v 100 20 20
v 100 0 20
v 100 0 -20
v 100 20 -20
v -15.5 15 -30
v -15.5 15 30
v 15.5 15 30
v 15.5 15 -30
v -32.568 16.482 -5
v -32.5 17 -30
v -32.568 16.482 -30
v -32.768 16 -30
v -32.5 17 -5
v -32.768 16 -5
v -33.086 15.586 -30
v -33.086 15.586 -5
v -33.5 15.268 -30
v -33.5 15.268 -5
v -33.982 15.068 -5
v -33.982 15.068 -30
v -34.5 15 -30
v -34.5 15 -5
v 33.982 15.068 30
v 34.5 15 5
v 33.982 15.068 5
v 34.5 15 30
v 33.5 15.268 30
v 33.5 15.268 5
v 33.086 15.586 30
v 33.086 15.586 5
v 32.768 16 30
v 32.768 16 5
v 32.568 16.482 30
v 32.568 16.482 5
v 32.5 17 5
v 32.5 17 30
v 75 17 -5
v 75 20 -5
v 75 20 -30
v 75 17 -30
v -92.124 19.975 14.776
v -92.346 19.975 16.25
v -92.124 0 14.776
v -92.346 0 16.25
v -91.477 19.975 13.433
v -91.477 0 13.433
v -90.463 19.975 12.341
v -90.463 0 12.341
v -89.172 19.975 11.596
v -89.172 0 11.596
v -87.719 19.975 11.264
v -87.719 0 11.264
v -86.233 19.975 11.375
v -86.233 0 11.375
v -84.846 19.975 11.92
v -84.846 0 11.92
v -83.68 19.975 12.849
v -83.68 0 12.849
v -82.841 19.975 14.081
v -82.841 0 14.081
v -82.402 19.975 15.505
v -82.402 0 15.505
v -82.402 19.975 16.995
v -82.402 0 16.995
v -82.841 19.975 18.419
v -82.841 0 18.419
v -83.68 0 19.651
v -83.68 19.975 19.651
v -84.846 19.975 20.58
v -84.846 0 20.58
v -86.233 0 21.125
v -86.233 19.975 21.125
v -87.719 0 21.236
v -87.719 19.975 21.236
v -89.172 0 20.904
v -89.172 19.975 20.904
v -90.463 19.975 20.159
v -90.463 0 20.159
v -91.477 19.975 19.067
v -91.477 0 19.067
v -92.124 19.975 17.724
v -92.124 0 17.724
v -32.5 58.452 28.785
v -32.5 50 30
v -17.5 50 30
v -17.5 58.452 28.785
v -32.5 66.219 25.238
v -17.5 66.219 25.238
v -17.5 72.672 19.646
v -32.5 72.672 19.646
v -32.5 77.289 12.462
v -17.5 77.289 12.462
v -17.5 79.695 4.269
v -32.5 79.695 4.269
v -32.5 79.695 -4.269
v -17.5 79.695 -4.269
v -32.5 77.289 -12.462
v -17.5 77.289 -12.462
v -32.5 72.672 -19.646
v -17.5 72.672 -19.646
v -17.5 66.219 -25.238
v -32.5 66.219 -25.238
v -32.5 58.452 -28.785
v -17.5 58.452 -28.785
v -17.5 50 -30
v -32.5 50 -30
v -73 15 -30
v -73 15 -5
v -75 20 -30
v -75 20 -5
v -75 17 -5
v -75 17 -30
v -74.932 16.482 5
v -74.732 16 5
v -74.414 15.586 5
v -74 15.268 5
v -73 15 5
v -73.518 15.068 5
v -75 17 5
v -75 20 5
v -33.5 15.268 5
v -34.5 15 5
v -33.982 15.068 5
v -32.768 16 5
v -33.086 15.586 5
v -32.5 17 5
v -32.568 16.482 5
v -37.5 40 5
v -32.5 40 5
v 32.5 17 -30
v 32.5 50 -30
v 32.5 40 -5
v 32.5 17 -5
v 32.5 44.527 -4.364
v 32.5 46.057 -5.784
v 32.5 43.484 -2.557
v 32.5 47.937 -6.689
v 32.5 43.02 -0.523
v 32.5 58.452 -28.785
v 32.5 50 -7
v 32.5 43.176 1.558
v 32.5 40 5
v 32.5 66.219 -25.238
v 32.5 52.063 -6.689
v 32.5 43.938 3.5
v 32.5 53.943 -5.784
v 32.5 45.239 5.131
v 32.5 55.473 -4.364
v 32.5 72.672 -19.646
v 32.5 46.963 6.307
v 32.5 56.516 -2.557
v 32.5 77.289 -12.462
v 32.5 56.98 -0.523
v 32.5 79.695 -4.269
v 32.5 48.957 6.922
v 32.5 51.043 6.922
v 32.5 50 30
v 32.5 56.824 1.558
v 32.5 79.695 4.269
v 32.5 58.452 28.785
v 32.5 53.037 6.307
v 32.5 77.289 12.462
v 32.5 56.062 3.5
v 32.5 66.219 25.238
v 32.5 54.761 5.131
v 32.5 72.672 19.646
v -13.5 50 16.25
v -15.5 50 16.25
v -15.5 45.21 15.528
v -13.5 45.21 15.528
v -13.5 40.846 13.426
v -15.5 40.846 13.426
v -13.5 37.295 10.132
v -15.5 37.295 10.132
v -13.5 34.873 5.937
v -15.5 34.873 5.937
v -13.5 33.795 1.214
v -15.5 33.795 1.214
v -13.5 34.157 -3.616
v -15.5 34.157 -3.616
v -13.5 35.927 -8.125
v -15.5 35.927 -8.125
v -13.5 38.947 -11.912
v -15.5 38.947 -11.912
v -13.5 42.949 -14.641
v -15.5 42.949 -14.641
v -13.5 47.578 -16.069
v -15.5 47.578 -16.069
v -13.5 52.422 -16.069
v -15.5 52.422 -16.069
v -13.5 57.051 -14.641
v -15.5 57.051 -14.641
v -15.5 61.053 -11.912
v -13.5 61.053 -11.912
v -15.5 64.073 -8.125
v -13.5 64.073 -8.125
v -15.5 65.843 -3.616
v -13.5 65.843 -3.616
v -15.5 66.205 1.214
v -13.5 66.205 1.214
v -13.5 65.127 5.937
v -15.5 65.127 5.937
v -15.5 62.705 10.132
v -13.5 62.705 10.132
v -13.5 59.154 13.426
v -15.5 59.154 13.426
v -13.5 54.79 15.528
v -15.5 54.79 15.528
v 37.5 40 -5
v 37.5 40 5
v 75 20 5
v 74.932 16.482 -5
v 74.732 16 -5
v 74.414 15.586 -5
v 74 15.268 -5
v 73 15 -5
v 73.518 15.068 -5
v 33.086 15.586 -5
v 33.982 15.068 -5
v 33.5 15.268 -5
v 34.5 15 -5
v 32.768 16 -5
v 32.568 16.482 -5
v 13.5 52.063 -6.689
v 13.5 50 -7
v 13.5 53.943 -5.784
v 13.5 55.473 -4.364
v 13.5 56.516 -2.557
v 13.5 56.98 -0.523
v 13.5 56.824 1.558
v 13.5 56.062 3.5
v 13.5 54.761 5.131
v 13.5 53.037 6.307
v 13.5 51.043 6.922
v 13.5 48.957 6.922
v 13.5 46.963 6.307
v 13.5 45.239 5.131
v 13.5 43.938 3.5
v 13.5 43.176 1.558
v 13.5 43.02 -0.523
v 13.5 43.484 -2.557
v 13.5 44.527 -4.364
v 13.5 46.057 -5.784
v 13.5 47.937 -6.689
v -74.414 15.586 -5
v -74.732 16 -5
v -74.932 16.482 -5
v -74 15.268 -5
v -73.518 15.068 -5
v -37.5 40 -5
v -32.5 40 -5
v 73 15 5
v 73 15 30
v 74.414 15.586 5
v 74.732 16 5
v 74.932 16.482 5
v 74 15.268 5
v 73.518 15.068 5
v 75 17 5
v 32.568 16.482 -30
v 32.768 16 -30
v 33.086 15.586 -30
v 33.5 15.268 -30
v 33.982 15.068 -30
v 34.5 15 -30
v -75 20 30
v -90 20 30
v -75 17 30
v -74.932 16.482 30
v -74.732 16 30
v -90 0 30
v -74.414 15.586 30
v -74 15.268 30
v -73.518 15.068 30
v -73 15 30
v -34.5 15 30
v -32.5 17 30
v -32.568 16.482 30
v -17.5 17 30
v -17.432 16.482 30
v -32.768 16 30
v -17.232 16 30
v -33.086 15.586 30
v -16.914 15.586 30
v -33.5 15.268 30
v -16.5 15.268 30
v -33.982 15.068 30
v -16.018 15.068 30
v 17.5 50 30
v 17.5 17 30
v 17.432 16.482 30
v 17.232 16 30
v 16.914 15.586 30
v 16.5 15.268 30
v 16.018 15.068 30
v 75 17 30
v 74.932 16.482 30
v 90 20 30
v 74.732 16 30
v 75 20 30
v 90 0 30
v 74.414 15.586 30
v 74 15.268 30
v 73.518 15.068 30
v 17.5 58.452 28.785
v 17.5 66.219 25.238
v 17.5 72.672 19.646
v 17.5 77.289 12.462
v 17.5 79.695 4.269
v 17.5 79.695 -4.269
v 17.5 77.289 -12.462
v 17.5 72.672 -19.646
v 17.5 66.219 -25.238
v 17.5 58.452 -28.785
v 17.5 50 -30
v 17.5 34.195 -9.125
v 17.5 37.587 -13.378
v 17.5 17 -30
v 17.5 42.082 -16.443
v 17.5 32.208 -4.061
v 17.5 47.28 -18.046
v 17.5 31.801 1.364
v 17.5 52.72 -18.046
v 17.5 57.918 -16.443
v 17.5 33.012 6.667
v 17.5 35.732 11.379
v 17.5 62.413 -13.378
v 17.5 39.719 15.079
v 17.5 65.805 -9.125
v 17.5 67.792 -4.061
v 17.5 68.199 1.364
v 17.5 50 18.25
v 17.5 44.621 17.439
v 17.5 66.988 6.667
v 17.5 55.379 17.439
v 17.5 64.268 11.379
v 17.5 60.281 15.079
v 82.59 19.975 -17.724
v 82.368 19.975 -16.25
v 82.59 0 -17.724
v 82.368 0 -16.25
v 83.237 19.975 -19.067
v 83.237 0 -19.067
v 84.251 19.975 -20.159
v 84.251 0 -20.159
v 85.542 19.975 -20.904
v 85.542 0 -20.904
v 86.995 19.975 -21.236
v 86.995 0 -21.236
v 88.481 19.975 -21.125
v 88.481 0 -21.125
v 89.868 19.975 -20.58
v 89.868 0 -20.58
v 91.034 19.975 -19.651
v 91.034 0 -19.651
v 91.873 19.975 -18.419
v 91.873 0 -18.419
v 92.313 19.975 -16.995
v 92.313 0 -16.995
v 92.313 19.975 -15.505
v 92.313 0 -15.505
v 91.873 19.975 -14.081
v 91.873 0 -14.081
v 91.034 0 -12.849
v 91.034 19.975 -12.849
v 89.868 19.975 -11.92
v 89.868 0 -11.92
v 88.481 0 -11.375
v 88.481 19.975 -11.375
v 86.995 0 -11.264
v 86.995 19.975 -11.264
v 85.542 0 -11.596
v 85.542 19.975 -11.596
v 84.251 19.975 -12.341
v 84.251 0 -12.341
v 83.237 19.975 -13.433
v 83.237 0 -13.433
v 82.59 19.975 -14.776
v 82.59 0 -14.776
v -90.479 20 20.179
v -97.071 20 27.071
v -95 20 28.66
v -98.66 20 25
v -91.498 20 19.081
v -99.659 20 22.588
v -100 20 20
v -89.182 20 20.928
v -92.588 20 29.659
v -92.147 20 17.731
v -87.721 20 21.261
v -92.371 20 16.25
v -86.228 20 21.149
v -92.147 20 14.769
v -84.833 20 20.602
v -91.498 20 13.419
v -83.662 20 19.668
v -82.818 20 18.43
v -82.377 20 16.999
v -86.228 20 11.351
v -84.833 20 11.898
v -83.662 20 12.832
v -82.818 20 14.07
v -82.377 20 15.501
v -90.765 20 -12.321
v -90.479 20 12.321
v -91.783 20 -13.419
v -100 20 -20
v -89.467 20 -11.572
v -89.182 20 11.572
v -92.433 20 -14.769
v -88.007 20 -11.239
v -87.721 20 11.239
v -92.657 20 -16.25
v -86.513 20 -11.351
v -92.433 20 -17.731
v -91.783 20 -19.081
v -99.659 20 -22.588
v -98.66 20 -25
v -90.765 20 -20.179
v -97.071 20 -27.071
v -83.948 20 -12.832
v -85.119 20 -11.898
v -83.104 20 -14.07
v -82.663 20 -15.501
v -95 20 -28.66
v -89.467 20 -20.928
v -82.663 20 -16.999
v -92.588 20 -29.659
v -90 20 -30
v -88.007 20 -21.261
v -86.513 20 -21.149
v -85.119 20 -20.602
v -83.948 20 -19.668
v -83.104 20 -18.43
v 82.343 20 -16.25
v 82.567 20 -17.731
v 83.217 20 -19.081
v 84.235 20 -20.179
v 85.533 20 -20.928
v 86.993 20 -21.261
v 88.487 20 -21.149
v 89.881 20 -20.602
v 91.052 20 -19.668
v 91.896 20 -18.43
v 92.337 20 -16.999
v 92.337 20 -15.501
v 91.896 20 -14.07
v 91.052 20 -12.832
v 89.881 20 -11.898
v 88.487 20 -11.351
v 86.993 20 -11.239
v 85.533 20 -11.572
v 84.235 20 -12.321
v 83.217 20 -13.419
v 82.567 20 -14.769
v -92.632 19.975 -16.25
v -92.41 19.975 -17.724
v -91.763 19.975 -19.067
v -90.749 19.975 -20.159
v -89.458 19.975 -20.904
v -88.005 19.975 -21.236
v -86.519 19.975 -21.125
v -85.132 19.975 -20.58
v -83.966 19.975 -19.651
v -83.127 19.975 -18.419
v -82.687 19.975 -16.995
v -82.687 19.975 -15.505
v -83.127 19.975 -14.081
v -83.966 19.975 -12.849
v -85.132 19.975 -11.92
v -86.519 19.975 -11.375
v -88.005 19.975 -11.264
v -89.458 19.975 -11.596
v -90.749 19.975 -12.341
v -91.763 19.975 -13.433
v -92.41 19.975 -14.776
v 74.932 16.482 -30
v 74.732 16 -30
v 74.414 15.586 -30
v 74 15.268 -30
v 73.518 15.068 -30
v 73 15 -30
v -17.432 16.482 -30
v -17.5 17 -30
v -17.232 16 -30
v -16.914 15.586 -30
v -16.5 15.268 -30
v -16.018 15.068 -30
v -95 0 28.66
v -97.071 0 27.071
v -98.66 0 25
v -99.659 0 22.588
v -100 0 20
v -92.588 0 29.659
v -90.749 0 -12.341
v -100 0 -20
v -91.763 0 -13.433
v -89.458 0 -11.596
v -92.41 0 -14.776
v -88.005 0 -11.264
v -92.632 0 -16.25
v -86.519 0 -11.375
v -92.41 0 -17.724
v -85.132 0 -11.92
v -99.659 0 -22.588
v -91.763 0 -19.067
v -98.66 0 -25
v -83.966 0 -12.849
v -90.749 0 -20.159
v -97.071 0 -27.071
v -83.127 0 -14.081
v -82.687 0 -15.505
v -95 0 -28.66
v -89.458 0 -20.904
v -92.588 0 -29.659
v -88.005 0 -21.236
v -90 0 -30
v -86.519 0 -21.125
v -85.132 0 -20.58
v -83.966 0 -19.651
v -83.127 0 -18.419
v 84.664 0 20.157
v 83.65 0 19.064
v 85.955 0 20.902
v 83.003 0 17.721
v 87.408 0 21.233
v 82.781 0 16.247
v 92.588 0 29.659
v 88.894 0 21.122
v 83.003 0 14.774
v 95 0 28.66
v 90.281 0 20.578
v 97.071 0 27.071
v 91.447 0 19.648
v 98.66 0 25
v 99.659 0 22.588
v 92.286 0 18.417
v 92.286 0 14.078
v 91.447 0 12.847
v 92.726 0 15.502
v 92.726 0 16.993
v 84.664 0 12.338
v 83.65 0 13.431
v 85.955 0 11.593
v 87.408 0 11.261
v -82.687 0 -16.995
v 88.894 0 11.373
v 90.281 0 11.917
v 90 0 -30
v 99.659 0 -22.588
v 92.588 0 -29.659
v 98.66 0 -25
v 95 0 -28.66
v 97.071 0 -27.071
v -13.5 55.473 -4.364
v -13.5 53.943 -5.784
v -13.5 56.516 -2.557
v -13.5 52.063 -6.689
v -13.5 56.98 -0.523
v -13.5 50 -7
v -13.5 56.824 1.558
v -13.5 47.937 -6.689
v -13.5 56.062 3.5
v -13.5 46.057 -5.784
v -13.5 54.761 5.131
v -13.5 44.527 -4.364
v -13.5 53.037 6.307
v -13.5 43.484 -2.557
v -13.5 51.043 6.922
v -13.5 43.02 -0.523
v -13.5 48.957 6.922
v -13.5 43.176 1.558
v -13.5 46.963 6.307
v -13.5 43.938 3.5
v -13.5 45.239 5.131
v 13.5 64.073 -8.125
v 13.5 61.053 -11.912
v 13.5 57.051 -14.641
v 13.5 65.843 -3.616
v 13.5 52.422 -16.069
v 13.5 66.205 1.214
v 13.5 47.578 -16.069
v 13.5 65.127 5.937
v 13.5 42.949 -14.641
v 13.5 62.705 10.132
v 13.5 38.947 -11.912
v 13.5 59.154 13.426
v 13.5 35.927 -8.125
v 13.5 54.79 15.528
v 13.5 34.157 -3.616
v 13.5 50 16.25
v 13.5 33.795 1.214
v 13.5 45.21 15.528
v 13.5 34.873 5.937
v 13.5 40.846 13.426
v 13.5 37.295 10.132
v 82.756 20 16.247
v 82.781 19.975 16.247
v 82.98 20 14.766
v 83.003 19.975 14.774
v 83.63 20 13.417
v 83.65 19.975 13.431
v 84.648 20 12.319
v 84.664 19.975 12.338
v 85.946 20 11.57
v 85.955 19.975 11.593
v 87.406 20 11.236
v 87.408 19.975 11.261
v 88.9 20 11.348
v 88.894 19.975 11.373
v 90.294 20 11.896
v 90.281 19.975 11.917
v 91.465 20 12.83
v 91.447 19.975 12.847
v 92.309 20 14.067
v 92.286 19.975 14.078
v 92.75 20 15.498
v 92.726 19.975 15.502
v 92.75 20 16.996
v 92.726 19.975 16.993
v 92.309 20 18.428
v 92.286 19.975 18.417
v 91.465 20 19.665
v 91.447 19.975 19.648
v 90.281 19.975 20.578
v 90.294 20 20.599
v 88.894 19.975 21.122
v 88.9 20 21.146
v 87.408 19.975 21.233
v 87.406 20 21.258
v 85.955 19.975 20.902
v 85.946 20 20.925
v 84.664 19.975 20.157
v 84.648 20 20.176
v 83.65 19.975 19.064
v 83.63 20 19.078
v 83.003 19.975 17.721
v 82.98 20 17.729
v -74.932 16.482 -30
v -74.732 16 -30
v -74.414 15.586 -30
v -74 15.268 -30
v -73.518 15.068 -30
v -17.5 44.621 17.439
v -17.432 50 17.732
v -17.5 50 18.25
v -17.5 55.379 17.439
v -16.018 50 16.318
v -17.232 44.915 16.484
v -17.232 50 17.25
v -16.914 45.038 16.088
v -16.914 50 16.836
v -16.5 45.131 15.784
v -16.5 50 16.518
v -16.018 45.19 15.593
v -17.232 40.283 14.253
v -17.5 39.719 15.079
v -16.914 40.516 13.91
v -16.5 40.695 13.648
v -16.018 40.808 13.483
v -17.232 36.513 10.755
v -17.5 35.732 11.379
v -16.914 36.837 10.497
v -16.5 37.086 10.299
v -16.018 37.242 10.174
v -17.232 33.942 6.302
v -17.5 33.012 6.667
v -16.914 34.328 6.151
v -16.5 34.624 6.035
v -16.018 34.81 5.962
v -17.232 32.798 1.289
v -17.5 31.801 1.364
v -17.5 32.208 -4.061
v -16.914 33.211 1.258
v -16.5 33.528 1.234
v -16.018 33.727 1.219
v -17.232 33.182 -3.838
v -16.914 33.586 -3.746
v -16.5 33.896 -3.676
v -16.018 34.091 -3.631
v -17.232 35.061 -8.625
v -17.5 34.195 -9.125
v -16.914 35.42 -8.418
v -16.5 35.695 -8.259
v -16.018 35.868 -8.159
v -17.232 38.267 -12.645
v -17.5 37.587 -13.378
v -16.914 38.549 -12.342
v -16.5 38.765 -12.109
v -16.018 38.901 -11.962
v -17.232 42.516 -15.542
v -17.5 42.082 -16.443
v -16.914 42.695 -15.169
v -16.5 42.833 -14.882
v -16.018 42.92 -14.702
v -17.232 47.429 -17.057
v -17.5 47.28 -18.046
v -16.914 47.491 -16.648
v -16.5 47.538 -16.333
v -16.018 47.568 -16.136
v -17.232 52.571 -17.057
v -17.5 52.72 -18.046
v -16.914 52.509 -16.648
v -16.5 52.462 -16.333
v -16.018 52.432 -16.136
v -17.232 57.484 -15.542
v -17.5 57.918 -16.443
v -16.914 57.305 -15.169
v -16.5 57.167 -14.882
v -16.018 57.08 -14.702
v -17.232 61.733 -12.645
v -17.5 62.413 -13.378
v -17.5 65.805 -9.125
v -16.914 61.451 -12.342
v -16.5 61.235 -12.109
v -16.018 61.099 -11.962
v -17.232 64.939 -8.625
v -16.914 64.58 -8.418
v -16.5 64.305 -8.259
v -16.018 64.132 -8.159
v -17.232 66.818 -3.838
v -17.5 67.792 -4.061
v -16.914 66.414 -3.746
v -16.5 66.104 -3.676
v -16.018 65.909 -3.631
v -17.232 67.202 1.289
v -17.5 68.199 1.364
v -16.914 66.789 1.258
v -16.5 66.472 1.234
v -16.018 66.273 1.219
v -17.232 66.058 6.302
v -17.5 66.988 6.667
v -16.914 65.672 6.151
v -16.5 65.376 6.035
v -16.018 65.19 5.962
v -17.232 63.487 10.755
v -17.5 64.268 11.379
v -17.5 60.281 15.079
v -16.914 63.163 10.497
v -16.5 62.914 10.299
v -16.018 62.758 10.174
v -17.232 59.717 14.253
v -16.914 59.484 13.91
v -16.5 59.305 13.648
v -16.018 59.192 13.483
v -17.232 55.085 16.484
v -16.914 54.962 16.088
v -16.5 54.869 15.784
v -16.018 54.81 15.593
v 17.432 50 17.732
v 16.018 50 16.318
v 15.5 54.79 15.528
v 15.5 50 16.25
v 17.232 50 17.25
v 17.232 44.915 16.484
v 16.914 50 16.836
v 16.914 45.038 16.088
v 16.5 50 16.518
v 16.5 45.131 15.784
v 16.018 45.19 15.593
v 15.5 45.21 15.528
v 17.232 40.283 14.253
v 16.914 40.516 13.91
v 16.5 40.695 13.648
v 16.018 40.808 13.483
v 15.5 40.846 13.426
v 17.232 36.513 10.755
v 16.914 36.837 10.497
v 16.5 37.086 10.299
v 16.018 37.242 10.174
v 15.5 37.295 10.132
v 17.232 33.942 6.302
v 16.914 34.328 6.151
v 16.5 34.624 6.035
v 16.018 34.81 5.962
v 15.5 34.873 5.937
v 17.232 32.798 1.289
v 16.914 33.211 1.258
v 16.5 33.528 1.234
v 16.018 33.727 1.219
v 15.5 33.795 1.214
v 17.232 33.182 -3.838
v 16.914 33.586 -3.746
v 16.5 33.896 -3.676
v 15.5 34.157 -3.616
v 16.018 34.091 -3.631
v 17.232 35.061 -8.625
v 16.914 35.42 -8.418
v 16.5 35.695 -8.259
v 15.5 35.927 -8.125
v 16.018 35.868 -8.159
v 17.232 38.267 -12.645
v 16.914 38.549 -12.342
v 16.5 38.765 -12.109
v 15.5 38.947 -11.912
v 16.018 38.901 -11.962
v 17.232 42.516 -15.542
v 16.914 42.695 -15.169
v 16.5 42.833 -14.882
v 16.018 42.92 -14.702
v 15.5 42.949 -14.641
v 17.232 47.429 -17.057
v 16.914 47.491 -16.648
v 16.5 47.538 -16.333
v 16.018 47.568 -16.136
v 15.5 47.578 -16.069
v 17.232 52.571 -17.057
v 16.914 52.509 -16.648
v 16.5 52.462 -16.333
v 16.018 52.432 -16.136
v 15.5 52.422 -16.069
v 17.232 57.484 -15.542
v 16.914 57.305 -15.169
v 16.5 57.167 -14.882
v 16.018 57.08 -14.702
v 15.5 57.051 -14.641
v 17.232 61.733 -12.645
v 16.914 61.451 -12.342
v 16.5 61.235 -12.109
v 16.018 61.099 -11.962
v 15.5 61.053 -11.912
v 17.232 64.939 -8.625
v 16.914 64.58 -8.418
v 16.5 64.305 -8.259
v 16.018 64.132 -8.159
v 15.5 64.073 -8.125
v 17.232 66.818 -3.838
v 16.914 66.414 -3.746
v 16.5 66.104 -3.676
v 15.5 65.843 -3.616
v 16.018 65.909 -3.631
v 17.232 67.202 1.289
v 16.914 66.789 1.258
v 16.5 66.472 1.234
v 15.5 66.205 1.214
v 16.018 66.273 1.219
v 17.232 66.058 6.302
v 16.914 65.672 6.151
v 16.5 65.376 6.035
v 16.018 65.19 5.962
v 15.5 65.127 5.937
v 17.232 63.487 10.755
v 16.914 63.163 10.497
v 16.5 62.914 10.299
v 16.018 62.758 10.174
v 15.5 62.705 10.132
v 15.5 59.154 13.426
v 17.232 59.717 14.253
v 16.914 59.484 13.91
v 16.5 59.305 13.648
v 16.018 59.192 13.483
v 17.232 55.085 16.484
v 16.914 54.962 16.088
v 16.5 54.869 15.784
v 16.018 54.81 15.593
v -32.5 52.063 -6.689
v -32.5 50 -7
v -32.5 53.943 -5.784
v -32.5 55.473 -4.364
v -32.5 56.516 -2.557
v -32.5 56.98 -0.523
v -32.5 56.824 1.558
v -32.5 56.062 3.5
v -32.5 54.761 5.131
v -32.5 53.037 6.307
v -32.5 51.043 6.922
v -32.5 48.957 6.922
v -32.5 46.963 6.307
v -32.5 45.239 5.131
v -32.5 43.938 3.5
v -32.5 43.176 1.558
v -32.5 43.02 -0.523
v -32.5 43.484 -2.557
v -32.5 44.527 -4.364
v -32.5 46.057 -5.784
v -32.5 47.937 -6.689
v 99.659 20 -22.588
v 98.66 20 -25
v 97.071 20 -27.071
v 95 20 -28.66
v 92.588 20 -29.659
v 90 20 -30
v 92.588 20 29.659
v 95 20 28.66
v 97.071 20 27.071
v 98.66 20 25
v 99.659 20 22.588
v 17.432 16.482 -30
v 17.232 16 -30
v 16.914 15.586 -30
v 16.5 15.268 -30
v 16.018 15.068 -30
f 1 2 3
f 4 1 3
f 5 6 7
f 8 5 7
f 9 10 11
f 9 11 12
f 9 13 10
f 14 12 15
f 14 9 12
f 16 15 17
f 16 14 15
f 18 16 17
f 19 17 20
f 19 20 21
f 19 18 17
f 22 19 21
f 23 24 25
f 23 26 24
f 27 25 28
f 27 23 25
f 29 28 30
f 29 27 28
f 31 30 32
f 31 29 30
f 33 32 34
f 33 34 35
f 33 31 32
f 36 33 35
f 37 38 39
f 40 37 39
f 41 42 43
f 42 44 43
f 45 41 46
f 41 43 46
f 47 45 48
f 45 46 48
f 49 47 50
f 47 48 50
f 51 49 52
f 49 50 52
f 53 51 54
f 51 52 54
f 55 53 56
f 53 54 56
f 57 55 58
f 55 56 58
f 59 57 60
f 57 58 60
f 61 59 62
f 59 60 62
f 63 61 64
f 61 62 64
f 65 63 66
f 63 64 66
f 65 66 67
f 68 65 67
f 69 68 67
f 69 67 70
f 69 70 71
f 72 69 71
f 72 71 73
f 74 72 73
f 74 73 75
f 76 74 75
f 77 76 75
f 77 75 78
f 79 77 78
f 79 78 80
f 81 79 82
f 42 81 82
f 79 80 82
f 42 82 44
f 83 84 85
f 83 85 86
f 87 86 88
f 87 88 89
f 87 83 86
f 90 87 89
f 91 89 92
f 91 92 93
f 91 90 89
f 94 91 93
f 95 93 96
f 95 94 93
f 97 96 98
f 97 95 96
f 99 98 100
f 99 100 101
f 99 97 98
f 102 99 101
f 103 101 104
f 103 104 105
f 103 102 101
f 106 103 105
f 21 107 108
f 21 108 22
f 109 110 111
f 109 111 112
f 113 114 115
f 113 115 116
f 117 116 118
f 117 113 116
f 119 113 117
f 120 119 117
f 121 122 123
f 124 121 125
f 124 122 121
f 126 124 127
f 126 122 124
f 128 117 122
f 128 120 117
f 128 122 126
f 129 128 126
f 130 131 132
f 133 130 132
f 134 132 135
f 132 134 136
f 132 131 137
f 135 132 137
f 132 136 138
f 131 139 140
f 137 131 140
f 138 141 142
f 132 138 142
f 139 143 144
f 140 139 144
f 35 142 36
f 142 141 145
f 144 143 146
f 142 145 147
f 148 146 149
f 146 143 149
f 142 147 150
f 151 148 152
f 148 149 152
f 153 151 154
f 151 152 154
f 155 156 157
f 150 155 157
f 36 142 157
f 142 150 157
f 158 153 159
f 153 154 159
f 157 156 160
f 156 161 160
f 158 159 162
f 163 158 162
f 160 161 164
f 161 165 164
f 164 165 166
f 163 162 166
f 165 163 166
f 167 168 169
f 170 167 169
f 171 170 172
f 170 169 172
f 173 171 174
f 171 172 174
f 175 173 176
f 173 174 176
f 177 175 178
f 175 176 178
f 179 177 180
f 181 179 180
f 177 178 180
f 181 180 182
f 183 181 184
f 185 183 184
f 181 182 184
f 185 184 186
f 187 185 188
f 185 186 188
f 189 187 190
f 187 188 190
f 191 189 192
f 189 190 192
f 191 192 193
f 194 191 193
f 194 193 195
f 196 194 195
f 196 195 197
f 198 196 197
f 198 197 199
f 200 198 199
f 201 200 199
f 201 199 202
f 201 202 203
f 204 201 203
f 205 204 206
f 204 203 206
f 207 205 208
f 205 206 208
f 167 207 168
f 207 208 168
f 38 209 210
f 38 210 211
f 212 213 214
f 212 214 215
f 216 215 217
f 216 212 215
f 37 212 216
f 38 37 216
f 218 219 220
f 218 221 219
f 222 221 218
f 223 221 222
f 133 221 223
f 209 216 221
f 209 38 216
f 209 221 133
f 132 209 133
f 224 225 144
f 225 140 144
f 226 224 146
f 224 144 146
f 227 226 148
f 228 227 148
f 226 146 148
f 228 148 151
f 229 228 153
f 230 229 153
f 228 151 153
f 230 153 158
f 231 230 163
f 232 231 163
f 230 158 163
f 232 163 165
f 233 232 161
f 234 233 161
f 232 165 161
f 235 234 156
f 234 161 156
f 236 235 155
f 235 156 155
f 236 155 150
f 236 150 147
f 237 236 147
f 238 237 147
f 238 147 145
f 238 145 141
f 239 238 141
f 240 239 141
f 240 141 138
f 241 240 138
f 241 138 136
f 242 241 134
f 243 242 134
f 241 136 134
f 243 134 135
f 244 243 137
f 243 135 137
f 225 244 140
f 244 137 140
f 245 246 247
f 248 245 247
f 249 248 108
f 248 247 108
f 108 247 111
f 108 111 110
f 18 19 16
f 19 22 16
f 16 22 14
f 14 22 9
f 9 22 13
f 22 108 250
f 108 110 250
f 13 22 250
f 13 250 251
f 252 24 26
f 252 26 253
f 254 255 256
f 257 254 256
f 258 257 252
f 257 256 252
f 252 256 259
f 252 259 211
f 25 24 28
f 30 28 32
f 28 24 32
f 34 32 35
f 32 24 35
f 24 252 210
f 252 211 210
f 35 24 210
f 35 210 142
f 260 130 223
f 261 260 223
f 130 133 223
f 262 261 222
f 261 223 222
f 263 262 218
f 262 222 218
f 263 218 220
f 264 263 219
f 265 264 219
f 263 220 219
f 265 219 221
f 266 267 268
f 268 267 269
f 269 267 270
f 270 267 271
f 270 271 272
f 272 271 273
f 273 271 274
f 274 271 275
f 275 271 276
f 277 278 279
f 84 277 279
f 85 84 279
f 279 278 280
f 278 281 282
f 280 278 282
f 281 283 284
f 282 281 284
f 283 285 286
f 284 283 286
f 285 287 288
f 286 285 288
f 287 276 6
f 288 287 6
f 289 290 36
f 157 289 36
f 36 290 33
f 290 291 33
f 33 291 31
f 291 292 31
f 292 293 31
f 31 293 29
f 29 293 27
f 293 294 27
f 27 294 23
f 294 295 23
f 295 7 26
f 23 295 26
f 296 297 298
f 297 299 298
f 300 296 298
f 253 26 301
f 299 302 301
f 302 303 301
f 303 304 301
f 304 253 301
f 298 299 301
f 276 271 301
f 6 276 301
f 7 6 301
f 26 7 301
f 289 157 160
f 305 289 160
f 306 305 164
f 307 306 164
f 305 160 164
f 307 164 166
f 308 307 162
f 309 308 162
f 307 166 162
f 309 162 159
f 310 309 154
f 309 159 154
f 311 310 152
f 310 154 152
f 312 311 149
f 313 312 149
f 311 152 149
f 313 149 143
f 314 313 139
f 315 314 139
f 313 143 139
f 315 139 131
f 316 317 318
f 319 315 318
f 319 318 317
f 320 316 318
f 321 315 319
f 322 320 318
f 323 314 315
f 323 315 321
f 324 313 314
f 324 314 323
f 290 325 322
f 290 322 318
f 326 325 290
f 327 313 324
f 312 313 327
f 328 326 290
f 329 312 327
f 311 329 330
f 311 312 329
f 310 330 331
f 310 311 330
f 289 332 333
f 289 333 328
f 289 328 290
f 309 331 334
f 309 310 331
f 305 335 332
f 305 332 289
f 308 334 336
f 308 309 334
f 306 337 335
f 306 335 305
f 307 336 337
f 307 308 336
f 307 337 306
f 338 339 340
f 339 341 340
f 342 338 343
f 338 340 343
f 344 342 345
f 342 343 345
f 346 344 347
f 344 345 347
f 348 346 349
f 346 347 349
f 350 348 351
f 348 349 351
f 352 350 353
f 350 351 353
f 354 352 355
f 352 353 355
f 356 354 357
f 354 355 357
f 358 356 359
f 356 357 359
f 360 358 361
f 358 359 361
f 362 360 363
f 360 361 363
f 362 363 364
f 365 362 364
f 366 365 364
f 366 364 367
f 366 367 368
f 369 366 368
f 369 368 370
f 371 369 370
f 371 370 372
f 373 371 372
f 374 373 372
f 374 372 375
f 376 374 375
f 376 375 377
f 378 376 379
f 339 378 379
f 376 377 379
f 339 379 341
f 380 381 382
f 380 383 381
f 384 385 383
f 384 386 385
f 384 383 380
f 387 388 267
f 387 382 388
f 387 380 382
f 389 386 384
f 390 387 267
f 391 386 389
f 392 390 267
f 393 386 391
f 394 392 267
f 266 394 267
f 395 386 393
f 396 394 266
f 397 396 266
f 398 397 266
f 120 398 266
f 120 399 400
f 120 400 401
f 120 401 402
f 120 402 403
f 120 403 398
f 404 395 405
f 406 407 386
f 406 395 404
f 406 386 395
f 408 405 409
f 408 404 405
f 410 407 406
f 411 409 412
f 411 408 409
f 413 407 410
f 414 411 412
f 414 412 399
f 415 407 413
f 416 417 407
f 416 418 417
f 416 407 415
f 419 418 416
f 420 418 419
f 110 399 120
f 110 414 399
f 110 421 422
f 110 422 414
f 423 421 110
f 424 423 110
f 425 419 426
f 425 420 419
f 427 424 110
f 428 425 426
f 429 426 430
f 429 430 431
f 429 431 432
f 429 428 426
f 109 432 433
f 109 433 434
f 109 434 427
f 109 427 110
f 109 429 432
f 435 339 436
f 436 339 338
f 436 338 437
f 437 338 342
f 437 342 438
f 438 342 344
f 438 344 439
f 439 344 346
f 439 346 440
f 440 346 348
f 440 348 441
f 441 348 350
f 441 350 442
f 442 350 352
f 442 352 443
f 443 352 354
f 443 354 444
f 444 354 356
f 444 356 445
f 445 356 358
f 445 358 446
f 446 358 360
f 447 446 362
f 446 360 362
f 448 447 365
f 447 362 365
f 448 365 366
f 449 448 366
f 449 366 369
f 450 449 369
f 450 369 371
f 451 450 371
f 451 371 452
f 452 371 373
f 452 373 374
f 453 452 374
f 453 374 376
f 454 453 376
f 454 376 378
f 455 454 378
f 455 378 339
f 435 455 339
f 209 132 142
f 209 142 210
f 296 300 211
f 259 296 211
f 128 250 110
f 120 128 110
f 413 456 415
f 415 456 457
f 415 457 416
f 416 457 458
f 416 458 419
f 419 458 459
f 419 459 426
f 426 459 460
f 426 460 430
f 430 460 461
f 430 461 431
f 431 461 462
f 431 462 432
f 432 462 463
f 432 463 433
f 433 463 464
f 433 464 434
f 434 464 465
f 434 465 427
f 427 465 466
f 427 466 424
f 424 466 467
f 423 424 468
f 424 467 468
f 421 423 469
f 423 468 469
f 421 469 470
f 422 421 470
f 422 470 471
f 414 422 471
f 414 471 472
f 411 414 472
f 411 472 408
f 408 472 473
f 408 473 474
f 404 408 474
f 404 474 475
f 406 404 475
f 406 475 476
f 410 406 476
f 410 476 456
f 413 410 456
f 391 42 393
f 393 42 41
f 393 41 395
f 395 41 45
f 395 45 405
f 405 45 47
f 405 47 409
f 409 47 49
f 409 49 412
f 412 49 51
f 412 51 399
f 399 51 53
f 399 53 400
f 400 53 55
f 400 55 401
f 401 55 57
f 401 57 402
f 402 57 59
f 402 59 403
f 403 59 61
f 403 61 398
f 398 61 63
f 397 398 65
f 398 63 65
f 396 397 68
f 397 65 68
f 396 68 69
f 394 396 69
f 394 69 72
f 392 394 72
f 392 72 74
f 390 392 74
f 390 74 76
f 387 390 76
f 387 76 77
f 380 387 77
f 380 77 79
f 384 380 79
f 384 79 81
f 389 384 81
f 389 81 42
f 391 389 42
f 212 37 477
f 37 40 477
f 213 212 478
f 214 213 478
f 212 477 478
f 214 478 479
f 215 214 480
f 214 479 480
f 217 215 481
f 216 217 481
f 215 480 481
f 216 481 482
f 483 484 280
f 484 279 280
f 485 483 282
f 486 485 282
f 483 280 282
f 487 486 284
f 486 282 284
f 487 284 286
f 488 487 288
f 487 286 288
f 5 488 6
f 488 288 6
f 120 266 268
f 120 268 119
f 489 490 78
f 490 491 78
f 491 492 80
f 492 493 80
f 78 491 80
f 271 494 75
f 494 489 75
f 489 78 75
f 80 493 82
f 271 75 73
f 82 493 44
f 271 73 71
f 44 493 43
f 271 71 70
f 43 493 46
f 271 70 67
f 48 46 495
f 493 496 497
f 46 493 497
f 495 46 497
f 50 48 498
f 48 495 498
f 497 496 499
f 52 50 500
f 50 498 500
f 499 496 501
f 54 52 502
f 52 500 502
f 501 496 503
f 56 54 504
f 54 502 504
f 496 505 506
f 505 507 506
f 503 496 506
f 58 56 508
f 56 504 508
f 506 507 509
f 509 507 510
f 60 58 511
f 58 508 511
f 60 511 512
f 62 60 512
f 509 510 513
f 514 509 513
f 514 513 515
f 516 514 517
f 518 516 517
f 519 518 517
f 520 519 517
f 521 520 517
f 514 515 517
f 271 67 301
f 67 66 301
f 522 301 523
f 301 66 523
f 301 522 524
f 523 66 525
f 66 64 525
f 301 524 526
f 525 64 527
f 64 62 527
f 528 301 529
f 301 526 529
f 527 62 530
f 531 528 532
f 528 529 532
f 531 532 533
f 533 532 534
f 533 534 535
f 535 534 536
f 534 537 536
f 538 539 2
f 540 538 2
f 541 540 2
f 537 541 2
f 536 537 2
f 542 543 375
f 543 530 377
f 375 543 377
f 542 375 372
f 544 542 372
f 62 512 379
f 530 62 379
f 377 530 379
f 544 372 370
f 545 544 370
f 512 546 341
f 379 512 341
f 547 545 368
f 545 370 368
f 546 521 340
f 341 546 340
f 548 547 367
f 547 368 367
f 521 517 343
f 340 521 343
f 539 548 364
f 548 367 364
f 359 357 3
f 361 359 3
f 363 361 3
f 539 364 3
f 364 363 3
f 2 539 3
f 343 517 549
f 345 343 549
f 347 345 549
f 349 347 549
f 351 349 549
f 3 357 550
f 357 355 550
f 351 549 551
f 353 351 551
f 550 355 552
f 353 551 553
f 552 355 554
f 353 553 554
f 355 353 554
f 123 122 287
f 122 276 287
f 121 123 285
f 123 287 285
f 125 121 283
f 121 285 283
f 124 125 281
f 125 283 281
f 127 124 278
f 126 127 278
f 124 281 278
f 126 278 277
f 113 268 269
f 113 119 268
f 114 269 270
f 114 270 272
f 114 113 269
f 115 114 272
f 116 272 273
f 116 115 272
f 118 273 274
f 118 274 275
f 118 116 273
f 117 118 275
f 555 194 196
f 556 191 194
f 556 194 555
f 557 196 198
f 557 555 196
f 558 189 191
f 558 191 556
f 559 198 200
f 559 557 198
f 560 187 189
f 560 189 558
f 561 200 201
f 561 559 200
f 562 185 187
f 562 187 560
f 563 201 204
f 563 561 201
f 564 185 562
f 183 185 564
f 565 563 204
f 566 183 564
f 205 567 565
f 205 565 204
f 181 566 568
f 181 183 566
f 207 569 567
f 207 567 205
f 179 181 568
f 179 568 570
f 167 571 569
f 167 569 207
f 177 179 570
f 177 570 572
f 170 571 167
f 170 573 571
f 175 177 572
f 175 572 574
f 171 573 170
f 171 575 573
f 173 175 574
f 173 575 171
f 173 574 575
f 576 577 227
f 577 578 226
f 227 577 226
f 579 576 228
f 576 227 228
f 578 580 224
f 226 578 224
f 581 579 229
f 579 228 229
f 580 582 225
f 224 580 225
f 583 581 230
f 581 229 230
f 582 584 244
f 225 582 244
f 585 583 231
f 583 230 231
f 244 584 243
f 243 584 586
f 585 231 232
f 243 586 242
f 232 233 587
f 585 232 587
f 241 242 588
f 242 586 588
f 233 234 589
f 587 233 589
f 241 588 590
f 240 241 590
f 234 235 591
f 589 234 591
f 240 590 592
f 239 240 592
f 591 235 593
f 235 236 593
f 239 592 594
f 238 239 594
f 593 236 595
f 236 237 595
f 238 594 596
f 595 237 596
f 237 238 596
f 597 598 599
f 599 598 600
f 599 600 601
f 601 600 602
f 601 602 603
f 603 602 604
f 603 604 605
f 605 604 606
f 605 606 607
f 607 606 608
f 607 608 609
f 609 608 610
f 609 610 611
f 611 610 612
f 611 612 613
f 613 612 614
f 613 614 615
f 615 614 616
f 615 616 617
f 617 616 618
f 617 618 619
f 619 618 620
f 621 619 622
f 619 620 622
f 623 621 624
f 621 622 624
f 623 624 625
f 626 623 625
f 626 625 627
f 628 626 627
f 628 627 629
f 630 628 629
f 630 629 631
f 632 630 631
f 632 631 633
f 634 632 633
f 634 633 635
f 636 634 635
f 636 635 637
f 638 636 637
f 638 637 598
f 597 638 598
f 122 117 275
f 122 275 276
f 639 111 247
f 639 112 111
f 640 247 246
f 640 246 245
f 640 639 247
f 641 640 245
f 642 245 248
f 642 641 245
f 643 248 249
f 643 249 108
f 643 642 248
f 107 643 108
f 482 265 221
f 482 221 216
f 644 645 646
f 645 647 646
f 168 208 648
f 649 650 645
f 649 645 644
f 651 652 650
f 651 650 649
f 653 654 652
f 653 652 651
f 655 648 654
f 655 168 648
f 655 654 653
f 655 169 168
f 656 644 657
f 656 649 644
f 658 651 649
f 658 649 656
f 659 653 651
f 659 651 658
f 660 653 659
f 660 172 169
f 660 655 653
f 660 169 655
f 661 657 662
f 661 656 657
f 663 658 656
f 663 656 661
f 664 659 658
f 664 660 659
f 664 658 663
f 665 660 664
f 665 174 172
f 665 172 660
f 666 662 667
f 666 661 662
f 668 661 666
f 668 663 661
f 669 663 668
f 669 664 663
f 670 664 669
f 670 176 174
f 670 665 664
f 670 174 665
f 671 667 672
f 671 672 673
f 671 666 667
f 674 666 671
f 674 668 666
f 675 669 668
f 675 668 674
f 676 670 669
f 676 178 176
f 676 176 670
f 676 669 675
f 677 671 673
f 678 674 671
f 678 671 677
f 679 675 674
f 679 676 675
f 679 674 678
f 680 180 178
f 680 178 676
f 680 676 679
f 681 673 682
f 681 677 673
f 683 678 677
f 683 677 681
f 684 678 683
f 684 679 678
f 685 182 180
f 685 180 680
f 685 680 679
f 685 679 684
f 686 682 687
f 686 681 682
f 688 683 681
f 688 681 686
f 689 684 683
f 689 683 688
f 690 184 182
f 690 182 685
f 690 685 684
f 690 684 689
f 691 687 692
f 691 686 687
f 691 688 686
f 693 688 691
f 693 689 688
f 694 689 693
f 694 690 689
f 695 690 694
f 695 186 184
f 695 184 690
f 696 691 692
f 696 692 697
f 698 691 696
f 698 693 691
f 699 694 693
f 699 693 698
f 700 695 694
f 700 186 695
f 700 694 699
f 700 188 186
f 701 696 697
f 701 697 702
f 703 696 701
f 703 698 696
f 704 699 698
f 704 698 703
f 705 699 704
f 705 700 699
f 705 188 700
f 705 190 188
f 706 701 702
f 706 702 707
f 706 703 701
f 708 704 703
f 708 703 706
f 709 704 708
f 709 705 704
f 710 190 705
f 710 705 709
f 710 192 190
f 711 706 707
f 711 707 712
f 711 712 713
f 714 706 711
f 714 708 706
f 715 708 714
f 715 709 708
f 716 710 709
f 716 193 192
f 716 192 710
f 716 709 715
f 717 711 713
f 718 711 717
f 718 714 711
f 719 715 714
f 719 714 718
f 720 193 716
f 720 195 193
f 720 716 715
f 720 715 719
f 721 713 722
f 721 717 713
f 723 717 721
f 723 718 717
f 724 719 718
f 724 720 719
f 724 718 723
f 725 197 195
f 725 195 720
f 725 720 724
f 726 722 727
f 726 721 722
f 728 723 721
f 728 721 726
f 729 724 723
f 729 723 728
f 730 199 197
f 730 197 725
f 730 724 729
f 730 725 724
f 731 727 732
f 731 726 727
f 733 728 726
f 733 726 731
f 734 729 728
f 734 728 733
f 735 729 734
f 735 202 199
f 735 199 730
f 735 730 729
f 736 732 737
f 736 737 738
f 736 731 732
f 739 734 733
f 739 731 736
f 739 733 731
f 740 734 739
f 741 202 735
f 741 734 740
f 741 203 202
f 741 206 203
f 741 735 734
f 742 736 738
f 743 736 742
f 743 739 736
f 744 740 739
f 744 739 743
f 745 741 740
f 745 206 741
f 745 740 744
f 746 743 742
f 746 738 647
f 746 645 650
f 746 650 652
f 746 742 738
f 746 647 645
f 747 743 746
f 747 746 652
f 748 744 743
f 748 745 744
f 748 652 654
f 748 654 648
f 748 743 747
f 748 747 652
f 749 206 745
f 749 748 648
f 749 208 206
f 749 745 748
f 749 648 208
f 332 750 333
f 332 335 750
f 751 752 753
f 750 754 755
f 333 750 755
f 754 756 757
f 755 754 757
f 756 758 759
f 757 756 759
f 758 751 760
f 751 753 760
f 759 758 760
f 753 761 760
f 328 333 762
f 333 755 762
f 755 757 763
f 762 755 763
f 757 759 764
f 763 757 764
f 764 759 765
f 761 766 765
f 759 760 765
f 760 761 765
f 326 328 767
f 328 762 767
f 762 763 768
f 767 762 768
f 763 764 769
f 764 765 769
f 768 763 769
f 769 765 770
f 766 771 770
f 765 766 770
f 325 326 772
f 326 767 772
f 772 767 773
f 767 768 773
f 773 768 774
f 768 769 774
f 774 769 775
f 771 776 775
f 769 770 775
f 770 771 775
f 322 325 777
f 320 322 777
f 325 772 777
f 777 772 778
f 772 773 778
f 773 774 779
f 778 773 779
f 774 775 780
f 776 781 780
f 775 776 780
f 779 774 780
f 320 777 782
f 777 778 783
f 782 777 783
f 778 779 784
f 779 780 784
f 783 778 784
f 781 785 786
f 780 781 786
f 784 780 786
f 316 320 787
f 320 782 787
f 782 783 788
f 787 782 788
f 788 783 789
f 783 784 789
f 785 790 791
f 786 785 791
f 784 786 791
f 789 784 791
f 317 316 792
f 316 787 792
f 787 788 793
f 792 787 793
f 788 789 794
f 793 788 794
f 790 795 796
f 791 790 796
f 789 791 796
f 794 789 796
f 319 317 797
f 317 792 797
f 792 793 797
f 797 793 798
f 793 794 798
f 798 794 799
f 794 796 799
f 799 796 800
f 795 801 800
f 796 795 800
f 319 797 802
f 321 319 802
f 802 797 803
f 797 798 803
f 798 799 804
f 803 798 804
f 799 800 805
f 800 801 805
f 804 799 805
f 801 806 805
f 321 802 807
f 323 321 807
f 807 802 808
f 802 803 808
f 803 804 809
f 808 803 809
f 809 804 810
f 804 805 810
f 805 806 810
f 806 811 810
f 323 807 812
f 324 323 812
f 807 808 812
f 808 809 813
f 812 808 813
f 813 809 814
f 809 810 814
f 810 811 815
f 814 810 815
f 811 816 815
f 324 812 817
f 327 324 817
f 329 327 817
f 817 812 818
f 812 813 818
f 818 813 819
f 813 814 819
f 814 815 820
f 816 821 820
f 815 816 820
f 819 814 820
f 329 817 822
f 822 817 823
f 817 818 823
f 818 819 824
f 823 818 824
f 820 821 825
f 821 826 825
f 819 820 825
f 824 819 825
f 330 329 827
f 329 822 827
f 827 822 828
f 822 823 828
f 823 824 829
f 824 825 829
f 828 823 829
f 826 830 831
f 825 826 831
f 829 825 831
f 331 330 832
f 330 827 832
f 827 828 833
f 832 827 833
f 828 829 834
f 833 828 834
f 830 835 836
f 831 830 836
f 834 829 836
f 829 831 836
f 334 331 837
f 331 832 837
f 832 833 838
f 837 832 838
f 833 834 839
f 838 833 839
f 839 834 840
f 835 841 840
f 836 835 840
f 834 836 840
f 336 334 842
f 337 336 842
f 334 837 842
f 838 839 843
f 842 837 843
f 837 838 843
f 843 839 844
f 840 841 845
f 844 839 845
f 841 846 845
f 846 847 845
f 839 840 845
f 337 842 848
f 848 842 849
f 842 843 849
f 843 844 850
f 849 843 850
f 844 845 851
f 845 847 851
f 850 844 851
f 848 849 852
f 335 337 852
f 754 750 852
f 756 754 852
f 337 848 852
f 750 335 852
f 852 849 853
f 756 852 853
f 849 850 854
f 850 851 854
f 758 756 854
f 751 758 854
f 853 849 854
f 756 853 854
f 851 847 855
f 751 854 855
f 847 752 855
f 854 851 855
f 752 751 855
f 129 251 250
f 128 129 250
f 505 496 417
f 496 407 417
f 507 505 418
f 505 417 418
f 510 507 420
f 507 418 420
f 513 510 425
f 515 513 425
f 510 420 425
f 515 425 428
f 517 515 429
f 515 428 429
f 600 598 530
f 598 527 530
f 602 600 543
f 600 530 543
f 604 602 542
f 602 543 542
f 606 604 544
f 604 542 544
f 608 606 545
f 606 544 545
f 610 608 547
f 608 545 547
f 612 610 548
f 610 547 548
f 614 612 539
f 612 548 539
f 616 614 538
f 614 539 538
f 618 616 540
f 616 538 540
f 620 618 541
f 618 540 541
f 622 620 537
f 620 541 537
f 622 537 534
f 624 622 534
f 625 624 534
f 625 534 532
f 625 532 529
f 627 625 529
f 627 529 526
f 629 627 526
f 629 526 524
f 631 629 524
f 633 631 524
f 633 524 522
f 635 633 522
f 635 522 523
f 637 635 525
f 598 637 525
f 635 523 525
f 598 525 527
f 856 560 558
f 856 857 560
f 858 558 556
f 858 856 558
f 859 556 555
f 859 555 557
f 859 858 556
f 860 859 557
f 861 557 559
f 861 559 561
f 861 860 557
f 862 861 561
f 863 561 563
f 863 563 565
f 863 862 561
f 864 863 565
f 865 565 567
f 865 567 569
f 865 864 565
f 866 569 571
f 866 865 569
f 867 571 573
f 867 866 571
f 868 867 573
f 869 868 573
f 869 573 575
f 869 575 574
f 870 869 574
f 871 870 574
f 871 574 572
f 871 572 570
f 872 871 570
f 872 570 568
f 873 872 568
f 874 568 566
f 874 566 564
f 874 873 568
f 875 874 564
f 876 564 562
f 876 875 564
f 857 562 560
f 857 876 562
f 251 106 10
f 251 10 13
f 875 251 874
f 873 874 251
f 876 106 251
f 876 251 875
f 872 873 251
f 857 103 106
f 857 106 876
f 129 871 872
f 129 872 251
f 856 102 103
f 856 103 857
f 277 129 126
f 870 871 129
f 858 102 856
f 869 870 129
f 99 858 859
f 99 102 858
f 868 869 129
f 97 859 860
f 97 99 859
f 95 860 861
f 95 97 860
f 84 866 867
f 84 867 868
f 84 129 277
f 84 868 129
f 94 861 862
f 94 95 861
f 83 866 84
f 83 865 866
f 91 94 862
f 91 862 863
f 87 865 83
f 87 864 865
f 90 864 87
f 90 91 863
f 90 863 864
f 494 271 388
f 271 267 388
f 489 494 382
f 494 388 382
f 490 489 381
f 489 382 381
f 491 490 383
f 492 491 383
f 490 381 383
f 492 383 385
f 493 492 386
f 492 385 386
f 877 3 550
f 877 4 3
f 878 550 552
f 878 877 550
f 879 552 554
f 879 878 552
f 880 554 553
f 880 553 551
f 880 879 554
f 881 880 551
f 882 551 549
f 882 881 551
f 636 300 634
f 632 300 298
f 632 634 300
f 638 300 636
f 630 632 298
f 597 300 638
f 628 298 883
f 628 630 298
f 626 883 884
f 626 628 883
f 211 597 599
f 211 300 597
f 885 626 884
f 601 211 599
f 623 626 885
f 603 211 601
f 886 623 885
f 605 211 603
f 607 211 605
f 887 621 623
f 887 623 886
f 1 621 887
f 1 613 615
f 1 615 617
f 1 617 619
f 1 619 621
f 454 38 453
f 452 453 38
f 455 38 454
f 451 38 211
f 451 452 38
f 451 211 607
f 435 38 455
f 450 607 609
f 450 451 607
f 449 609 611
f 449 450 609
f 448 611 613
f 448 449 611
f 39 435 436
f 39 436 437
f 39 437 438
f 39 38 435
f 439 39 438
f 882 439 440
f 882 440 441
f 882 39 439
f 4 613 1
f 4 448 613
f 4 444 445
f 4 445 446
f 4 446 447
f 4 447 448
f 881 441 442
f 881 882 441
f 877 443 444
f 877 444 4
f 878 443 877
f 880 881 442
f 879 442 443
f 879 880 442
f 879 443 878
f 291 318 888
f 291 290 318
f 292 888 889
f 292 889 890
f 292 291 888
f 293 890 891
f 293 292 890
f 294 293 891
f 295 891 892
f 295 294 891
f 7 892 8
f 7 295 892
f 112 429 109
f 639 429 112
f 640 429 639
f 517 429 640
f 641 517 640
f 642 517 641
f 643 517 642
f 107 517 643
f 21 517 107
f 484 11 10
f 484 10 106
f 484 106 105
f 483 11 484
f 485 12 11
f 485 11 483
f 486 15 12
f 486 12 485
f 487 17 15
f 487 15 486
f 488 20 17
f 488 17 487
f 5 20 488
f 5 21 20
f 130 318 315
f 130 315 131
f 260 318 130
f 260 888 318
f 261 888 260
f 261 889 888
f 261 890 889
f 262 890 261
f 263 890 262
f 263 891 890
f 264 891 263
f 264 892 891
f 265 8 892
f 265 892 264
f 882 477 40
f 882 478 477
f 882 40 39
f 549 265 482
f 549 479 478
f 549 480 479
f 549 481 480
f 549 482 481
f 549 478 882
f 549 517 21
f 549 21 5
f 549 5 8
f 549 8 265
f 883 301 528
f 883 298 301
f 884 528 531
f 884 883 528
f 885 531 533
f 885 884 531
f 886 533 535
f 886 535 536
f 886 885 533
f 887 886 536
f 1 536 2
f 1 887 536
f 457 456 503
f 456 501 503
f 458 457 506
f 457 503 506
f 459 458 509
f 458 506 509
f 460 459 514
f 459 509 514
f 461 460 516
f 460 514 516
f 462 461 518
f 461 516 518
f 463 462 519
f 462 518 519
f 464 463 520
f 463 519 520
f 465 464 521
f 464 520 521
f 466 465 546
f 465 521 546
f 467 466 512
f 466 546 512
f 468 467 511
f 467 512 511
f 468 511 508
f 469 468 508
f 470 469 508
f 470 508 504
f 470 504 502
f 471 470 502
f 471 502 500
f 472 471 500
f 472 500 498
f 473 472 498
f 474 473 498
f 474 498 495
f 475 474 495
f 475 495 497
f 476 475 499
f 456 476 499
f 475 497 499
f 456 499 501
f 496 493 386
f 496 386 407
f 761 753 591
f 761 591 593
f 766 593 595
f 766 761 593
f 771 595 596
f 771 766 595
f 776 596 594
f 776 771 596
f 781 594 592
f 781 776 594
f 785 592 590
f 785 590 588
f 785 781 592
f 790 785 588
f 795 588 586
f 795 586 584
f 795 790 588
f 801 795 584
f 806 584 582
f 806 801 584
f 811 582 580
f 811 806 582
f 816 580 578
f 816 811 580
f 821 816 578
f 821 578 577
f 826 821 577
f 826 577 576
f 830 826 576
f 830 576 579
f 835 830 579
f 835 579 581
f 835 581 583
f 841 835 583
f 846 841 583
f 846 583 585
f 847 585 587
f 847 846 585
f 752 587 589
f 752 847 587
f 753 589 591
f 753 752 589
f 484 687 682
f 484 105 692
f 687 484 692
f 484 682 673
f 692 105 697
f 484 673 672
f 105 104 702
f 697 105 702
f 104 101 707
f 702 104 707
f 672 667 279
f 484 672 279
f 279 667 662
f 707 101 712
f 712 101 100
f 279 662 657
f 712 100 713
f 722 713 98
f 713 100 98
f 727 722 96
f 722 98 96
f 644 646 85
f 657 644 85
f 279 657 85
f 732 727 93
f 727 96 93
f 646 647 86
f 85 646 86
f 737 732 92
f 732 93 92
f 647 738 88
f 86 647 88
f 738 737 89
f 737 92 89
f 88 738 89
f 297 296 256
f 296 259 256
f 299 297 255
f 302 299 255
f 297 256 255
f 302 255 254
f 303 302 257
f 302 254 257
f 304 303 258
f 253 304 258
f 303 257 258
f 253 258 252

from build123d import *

# Parameters (mm, degrees)
SKETCH1_W                        = 200
SKETCH1_H                        = 60
BOSS_EXTRUDE1_DEPTH              = 20
SKETCH2_W                        = 150
SKETCH2_H                        = 60
CUT_EXTRUDE1_DEPTH               = 5
SKETCH5_R                        = 7
BOSS_EXTRUDE2_DEPTH              = 15
RIB1_START                       = -5
RIB1_DEPTH                       = 10
SKETCH7_R                        = 16.25
SKETCH7_R_2                      = 7
BOSS_EXTRUDE3_DEPTH              = 4
FILLET1_R                        = 10
FILLET2_R                        = 2
F_10_0MM_DOWEL_HOLE2_D           = 10
F_10_0MM_DOWEL_HOLE2_CSINK_D     = 10.05
F_10_0MM_DOWEL_HOLE2_CSINK_ANGLE = 90


# Read off the part's stored shape, not the designer's step: Rib1
with BuildPart() as part:
    # Sketch1 → Boss-Extrude1 (new body)
    with BuildSketch(Plane(origin=(0, 0, 0), x_dir=(1, 0, 0), z_dir=(0, 1, 0))):
        Rectangle(SKETCH1_W, SKETCH1_H)
    extrude(amount=BOSS_EXTRUDE1_DEPTH)

    # Sketch2 → Cut-Extrude1 (cut)
    with BuildSketch(Plane(origin=(0, 20, 0), x_dir=(1, 0, 0), z_dir=(0, 1, 0))):
        Rectangle(SKETCH2_W, SKETCH2_H)
    extrude(amount=-CUT_EXTRUDE1_DEPTH, mode=Mode.SUBTRACT)

    # Sketch5 → Boss-Extrude2 (add)
    with BuildSketch(Plane(origin=(-32.5, 0, 0), x_dir=(0, 0, -1), z_dir=(1, 0, 0))):
        with BuildLine():
            Line((-30, 15), (-30, 50))
            ThreePointArc((-30, 50), (0, 80), (30, 50))
            Line((30, 50), (30, 15))
            Line((30, 15), (-30, 15))
        make_face()
        with Locations((0, 50)):
            Circle(SKETCH5_R, mode=Mode.SUBTRACT)
    boss_extrude2 = extrude(amount=BOSS_EXTRUDE2_DEPTH)

    # Rib1 outline → Rib1 (add)
    with BuildSketch(Plane.XY.offset(RIB1_START)):
        Polygon((-37.5, 40), (-75, 20), (-75, 15), (-32.5, 15), (-32.5, 40), align=None)
    rib1 = extrude(amount=RIB1_DEPTH)

    # Sketch7 → Boss-Extrude3 (add)
    with BuildSketch(Plane(origin=(-17.5, 0, 0), x_dir=(0, 0, -1), z_dir=(1, 0, 0))):
        with Locations(Location((0, 50, 0), (0, 0, 180))):
            Circle(SKETCH7_R)
        with Locations((0, 50)):
            Circle(SKETCH7_R_2, mode=Mode.SUBTRACT)
    boss_extrude3 = extrude(amount=BOSS_EXTRUDE3_DEPTH)

    # Mirror1: Boss-Extrude2, Rib1, Boss-Extrude3 across plane
    add(boss_extrude2.mirror(Plane(origin=(0, 0, 0), x_dir=(0, 0, 1), z_dir=(1, 0, 0))))
    add(rib1.mirror(Plane(origin=(0, 0, 0), x_dir=(0, 0, 1), z_dir=(1, 0, 0))))
    add(boss_extrude3.mirror(Plane(origin=(0, 0, 0), x_dir=(0, 0, 1), z_dir=(1, 0, 0))))

    # Fillet1
    fillet1_edges = [part.edges().sort_by_distance(p)[0] for p in [
        (100, 10, 30),
        (-100, 10, 30),
        (-100, 10, -30),
        (100, 10, -30),
    ]]
    fillet(fillet1_edges, radius=FILLET1_R)

    # Fillet2
    fillet2_edges = [part.edges().sort_by_distance(p)[0] for p in [
        (32.5, 15, -17.5),
        (75, 15, -17.5),
        (17.5, 50, -16.25),
        (75, 15, 17.5),
        (-75, 15, -17.5),
        (-17.5, 15, 0),
        (-32.5, 15, 17.5),
        (-32.5, 15, -17.5),
        (-75, 15, 17.5),
        (-17.5, 50, -16.25),
        (17.5, 15, 0),
        (32.5, 15, 17.5),
    ]]
    fillet(fillet2_edges, radius=FILLET2_R)

    # Ø10.0mm Dowel Hole2 (through all)
    with Locations(Plane(origin=(0, 20, 0), x_dir=(1, 0, 0), z_dir=(0, 1, 0))):
        with Locations((-87.631640785, 16.25), (-87.345692882, -16.25), (87.368359215, 16.25), (87.781361724, -16.247375724)):
            CounterSinkHole(F_10_0MM_DOWEL_HOLE2_D / 2, F_10_0MM_DOWEL_HOLE2_CSINK_D / 2, counter_sink_angle=F_10_0MM_DOWEL_HOLE2_CSINK_ANGLE)


solid = part.part
